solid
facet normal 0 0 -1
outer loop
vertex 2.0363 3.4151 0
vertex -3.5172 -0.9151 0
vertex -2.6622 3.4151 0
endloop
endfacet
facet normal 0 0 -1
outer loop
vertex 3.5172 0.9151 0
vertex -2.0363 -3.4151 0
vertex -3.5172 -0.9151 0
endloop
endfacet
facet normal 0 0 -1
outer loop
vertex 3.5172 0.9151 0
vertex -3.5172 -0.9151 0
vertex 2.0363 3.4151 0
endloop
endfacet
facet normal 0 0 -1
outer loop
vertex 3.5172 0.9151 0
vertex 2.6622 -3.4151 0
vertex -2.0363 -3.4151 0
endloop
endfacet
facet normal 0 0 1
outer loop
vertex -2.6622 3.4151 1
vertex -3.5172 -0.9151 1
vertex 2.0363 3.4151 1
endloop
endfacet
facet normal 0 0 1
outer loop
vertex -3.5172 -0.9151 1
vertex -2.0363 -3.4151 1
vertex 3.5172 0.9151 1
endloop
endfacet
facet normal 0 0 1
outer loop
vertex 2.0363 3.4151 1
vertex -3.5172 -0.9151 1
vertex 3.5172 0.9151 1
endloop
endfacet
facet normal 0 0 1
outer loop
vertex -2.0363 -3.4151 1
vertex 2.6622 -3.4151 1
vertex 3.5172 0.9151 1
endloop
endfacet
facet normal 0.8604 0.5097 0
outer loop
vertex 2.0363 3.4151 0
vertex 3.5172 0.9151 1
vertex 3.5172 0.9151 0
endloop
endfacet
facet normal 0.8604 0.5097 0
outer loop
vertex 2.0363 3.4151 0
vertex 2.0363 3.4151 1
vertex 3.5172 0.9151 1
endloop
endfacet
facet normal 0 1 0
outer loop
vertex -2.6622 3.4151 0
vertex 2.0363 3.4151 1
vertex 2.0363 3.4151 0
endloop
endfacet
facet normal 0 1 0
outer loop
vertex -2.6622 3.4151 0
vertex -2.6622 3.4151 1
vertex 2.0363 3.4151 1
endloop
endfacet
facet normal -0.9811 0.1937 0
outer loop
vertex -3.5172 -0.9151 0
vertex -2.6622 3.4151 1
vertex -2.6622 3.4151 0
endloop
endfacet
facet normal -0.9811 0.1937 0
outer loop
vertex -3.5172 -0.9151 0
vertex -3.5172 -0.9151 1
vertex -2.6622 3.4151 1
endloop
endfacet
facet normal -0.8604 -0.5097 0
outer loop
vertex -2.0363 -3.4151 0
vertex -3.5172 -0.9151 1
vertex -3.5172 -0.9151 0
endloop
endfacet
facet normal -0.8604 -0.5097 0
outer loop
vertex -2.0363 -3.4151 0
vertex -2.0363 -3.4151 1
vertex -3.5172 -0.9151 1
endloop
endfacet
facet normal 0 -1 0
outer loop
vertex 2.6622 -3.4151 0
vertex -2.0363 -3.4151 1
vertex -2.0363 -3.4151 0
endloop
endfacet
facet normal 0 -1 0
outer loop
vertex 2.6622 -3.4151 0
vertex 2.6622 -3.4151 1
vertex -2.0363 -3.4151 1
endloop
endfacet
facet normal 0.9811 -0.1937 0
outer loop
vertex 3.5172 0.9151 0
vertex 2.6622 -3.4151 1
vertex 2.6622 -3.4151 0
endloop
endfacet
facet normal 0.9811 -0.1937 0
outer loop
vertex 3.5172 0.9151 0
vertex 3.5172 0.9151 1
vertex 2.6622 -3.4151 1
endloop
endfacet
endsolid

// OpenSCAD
// projection of a rotated cube
linear_extrude(1) projection() rotate([30, 20, 0]) cube(5, center = true);
